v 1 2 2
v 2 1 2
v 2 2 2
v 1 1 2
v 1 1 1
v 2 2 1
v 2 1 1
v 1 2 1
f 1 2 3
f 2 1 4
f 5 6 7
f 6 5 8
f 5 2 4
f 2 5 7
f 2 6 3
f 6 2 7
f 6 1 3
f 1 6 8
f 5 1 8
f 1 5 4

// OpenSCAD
// file: utils.scad
///< Utilities

function rand_clr() = rands( 0,1,3 );

///< Length conversions
function in2mm( i ) = ( i * 25.4 ); 
function mm2in( m ) = ( m / 25.4 );
// file: math.scad
///< Math scad module


///< Find the hypotenuse from two sides of a right triangle
function hyp_from_sides( a, b ) = sqrt( pow( a, 2 ) + pow( b, 2 ) );

///< Find equal sides from hypotenuse of a right triangle
function sides_from_hyp(h) = sqrt( pow( h, 2 ) / 2 );

///< Find A from hypotenuse and B
function a_from_hb( h, b ) = sqrt( pow( h, 2 ) - pow( b, 2 ) );

///< Test for math functions

A = 3;
B = 4;
echo("Given A=", A, "and B=", B );
H = hyp_from_sides( A, B );
echo("Hypotenuse=", H );
echo("Calc Correct = ", (H == 5) );

echo("Given H=", H, " which is a hypotenuse with equal sides" );
echo( "the sides=", sides_from_hyp( H ) );

echo("Given H=", H, "B=", 4 );
echo("A=", a_from_hb( H, 4 ) );
// main file
///< Object definition
use <math.scad>;
use <utils.scad>;

///< Parameters
x = 1;
y = 1;
z = 1;

h = 1;
w = 1;
d = 1;

///< Modules
module object( height, width, depth ){
     translate( [ x, y, z ] ) cube( height, width, depth );
}

///< Build object
object( h, w, d );
